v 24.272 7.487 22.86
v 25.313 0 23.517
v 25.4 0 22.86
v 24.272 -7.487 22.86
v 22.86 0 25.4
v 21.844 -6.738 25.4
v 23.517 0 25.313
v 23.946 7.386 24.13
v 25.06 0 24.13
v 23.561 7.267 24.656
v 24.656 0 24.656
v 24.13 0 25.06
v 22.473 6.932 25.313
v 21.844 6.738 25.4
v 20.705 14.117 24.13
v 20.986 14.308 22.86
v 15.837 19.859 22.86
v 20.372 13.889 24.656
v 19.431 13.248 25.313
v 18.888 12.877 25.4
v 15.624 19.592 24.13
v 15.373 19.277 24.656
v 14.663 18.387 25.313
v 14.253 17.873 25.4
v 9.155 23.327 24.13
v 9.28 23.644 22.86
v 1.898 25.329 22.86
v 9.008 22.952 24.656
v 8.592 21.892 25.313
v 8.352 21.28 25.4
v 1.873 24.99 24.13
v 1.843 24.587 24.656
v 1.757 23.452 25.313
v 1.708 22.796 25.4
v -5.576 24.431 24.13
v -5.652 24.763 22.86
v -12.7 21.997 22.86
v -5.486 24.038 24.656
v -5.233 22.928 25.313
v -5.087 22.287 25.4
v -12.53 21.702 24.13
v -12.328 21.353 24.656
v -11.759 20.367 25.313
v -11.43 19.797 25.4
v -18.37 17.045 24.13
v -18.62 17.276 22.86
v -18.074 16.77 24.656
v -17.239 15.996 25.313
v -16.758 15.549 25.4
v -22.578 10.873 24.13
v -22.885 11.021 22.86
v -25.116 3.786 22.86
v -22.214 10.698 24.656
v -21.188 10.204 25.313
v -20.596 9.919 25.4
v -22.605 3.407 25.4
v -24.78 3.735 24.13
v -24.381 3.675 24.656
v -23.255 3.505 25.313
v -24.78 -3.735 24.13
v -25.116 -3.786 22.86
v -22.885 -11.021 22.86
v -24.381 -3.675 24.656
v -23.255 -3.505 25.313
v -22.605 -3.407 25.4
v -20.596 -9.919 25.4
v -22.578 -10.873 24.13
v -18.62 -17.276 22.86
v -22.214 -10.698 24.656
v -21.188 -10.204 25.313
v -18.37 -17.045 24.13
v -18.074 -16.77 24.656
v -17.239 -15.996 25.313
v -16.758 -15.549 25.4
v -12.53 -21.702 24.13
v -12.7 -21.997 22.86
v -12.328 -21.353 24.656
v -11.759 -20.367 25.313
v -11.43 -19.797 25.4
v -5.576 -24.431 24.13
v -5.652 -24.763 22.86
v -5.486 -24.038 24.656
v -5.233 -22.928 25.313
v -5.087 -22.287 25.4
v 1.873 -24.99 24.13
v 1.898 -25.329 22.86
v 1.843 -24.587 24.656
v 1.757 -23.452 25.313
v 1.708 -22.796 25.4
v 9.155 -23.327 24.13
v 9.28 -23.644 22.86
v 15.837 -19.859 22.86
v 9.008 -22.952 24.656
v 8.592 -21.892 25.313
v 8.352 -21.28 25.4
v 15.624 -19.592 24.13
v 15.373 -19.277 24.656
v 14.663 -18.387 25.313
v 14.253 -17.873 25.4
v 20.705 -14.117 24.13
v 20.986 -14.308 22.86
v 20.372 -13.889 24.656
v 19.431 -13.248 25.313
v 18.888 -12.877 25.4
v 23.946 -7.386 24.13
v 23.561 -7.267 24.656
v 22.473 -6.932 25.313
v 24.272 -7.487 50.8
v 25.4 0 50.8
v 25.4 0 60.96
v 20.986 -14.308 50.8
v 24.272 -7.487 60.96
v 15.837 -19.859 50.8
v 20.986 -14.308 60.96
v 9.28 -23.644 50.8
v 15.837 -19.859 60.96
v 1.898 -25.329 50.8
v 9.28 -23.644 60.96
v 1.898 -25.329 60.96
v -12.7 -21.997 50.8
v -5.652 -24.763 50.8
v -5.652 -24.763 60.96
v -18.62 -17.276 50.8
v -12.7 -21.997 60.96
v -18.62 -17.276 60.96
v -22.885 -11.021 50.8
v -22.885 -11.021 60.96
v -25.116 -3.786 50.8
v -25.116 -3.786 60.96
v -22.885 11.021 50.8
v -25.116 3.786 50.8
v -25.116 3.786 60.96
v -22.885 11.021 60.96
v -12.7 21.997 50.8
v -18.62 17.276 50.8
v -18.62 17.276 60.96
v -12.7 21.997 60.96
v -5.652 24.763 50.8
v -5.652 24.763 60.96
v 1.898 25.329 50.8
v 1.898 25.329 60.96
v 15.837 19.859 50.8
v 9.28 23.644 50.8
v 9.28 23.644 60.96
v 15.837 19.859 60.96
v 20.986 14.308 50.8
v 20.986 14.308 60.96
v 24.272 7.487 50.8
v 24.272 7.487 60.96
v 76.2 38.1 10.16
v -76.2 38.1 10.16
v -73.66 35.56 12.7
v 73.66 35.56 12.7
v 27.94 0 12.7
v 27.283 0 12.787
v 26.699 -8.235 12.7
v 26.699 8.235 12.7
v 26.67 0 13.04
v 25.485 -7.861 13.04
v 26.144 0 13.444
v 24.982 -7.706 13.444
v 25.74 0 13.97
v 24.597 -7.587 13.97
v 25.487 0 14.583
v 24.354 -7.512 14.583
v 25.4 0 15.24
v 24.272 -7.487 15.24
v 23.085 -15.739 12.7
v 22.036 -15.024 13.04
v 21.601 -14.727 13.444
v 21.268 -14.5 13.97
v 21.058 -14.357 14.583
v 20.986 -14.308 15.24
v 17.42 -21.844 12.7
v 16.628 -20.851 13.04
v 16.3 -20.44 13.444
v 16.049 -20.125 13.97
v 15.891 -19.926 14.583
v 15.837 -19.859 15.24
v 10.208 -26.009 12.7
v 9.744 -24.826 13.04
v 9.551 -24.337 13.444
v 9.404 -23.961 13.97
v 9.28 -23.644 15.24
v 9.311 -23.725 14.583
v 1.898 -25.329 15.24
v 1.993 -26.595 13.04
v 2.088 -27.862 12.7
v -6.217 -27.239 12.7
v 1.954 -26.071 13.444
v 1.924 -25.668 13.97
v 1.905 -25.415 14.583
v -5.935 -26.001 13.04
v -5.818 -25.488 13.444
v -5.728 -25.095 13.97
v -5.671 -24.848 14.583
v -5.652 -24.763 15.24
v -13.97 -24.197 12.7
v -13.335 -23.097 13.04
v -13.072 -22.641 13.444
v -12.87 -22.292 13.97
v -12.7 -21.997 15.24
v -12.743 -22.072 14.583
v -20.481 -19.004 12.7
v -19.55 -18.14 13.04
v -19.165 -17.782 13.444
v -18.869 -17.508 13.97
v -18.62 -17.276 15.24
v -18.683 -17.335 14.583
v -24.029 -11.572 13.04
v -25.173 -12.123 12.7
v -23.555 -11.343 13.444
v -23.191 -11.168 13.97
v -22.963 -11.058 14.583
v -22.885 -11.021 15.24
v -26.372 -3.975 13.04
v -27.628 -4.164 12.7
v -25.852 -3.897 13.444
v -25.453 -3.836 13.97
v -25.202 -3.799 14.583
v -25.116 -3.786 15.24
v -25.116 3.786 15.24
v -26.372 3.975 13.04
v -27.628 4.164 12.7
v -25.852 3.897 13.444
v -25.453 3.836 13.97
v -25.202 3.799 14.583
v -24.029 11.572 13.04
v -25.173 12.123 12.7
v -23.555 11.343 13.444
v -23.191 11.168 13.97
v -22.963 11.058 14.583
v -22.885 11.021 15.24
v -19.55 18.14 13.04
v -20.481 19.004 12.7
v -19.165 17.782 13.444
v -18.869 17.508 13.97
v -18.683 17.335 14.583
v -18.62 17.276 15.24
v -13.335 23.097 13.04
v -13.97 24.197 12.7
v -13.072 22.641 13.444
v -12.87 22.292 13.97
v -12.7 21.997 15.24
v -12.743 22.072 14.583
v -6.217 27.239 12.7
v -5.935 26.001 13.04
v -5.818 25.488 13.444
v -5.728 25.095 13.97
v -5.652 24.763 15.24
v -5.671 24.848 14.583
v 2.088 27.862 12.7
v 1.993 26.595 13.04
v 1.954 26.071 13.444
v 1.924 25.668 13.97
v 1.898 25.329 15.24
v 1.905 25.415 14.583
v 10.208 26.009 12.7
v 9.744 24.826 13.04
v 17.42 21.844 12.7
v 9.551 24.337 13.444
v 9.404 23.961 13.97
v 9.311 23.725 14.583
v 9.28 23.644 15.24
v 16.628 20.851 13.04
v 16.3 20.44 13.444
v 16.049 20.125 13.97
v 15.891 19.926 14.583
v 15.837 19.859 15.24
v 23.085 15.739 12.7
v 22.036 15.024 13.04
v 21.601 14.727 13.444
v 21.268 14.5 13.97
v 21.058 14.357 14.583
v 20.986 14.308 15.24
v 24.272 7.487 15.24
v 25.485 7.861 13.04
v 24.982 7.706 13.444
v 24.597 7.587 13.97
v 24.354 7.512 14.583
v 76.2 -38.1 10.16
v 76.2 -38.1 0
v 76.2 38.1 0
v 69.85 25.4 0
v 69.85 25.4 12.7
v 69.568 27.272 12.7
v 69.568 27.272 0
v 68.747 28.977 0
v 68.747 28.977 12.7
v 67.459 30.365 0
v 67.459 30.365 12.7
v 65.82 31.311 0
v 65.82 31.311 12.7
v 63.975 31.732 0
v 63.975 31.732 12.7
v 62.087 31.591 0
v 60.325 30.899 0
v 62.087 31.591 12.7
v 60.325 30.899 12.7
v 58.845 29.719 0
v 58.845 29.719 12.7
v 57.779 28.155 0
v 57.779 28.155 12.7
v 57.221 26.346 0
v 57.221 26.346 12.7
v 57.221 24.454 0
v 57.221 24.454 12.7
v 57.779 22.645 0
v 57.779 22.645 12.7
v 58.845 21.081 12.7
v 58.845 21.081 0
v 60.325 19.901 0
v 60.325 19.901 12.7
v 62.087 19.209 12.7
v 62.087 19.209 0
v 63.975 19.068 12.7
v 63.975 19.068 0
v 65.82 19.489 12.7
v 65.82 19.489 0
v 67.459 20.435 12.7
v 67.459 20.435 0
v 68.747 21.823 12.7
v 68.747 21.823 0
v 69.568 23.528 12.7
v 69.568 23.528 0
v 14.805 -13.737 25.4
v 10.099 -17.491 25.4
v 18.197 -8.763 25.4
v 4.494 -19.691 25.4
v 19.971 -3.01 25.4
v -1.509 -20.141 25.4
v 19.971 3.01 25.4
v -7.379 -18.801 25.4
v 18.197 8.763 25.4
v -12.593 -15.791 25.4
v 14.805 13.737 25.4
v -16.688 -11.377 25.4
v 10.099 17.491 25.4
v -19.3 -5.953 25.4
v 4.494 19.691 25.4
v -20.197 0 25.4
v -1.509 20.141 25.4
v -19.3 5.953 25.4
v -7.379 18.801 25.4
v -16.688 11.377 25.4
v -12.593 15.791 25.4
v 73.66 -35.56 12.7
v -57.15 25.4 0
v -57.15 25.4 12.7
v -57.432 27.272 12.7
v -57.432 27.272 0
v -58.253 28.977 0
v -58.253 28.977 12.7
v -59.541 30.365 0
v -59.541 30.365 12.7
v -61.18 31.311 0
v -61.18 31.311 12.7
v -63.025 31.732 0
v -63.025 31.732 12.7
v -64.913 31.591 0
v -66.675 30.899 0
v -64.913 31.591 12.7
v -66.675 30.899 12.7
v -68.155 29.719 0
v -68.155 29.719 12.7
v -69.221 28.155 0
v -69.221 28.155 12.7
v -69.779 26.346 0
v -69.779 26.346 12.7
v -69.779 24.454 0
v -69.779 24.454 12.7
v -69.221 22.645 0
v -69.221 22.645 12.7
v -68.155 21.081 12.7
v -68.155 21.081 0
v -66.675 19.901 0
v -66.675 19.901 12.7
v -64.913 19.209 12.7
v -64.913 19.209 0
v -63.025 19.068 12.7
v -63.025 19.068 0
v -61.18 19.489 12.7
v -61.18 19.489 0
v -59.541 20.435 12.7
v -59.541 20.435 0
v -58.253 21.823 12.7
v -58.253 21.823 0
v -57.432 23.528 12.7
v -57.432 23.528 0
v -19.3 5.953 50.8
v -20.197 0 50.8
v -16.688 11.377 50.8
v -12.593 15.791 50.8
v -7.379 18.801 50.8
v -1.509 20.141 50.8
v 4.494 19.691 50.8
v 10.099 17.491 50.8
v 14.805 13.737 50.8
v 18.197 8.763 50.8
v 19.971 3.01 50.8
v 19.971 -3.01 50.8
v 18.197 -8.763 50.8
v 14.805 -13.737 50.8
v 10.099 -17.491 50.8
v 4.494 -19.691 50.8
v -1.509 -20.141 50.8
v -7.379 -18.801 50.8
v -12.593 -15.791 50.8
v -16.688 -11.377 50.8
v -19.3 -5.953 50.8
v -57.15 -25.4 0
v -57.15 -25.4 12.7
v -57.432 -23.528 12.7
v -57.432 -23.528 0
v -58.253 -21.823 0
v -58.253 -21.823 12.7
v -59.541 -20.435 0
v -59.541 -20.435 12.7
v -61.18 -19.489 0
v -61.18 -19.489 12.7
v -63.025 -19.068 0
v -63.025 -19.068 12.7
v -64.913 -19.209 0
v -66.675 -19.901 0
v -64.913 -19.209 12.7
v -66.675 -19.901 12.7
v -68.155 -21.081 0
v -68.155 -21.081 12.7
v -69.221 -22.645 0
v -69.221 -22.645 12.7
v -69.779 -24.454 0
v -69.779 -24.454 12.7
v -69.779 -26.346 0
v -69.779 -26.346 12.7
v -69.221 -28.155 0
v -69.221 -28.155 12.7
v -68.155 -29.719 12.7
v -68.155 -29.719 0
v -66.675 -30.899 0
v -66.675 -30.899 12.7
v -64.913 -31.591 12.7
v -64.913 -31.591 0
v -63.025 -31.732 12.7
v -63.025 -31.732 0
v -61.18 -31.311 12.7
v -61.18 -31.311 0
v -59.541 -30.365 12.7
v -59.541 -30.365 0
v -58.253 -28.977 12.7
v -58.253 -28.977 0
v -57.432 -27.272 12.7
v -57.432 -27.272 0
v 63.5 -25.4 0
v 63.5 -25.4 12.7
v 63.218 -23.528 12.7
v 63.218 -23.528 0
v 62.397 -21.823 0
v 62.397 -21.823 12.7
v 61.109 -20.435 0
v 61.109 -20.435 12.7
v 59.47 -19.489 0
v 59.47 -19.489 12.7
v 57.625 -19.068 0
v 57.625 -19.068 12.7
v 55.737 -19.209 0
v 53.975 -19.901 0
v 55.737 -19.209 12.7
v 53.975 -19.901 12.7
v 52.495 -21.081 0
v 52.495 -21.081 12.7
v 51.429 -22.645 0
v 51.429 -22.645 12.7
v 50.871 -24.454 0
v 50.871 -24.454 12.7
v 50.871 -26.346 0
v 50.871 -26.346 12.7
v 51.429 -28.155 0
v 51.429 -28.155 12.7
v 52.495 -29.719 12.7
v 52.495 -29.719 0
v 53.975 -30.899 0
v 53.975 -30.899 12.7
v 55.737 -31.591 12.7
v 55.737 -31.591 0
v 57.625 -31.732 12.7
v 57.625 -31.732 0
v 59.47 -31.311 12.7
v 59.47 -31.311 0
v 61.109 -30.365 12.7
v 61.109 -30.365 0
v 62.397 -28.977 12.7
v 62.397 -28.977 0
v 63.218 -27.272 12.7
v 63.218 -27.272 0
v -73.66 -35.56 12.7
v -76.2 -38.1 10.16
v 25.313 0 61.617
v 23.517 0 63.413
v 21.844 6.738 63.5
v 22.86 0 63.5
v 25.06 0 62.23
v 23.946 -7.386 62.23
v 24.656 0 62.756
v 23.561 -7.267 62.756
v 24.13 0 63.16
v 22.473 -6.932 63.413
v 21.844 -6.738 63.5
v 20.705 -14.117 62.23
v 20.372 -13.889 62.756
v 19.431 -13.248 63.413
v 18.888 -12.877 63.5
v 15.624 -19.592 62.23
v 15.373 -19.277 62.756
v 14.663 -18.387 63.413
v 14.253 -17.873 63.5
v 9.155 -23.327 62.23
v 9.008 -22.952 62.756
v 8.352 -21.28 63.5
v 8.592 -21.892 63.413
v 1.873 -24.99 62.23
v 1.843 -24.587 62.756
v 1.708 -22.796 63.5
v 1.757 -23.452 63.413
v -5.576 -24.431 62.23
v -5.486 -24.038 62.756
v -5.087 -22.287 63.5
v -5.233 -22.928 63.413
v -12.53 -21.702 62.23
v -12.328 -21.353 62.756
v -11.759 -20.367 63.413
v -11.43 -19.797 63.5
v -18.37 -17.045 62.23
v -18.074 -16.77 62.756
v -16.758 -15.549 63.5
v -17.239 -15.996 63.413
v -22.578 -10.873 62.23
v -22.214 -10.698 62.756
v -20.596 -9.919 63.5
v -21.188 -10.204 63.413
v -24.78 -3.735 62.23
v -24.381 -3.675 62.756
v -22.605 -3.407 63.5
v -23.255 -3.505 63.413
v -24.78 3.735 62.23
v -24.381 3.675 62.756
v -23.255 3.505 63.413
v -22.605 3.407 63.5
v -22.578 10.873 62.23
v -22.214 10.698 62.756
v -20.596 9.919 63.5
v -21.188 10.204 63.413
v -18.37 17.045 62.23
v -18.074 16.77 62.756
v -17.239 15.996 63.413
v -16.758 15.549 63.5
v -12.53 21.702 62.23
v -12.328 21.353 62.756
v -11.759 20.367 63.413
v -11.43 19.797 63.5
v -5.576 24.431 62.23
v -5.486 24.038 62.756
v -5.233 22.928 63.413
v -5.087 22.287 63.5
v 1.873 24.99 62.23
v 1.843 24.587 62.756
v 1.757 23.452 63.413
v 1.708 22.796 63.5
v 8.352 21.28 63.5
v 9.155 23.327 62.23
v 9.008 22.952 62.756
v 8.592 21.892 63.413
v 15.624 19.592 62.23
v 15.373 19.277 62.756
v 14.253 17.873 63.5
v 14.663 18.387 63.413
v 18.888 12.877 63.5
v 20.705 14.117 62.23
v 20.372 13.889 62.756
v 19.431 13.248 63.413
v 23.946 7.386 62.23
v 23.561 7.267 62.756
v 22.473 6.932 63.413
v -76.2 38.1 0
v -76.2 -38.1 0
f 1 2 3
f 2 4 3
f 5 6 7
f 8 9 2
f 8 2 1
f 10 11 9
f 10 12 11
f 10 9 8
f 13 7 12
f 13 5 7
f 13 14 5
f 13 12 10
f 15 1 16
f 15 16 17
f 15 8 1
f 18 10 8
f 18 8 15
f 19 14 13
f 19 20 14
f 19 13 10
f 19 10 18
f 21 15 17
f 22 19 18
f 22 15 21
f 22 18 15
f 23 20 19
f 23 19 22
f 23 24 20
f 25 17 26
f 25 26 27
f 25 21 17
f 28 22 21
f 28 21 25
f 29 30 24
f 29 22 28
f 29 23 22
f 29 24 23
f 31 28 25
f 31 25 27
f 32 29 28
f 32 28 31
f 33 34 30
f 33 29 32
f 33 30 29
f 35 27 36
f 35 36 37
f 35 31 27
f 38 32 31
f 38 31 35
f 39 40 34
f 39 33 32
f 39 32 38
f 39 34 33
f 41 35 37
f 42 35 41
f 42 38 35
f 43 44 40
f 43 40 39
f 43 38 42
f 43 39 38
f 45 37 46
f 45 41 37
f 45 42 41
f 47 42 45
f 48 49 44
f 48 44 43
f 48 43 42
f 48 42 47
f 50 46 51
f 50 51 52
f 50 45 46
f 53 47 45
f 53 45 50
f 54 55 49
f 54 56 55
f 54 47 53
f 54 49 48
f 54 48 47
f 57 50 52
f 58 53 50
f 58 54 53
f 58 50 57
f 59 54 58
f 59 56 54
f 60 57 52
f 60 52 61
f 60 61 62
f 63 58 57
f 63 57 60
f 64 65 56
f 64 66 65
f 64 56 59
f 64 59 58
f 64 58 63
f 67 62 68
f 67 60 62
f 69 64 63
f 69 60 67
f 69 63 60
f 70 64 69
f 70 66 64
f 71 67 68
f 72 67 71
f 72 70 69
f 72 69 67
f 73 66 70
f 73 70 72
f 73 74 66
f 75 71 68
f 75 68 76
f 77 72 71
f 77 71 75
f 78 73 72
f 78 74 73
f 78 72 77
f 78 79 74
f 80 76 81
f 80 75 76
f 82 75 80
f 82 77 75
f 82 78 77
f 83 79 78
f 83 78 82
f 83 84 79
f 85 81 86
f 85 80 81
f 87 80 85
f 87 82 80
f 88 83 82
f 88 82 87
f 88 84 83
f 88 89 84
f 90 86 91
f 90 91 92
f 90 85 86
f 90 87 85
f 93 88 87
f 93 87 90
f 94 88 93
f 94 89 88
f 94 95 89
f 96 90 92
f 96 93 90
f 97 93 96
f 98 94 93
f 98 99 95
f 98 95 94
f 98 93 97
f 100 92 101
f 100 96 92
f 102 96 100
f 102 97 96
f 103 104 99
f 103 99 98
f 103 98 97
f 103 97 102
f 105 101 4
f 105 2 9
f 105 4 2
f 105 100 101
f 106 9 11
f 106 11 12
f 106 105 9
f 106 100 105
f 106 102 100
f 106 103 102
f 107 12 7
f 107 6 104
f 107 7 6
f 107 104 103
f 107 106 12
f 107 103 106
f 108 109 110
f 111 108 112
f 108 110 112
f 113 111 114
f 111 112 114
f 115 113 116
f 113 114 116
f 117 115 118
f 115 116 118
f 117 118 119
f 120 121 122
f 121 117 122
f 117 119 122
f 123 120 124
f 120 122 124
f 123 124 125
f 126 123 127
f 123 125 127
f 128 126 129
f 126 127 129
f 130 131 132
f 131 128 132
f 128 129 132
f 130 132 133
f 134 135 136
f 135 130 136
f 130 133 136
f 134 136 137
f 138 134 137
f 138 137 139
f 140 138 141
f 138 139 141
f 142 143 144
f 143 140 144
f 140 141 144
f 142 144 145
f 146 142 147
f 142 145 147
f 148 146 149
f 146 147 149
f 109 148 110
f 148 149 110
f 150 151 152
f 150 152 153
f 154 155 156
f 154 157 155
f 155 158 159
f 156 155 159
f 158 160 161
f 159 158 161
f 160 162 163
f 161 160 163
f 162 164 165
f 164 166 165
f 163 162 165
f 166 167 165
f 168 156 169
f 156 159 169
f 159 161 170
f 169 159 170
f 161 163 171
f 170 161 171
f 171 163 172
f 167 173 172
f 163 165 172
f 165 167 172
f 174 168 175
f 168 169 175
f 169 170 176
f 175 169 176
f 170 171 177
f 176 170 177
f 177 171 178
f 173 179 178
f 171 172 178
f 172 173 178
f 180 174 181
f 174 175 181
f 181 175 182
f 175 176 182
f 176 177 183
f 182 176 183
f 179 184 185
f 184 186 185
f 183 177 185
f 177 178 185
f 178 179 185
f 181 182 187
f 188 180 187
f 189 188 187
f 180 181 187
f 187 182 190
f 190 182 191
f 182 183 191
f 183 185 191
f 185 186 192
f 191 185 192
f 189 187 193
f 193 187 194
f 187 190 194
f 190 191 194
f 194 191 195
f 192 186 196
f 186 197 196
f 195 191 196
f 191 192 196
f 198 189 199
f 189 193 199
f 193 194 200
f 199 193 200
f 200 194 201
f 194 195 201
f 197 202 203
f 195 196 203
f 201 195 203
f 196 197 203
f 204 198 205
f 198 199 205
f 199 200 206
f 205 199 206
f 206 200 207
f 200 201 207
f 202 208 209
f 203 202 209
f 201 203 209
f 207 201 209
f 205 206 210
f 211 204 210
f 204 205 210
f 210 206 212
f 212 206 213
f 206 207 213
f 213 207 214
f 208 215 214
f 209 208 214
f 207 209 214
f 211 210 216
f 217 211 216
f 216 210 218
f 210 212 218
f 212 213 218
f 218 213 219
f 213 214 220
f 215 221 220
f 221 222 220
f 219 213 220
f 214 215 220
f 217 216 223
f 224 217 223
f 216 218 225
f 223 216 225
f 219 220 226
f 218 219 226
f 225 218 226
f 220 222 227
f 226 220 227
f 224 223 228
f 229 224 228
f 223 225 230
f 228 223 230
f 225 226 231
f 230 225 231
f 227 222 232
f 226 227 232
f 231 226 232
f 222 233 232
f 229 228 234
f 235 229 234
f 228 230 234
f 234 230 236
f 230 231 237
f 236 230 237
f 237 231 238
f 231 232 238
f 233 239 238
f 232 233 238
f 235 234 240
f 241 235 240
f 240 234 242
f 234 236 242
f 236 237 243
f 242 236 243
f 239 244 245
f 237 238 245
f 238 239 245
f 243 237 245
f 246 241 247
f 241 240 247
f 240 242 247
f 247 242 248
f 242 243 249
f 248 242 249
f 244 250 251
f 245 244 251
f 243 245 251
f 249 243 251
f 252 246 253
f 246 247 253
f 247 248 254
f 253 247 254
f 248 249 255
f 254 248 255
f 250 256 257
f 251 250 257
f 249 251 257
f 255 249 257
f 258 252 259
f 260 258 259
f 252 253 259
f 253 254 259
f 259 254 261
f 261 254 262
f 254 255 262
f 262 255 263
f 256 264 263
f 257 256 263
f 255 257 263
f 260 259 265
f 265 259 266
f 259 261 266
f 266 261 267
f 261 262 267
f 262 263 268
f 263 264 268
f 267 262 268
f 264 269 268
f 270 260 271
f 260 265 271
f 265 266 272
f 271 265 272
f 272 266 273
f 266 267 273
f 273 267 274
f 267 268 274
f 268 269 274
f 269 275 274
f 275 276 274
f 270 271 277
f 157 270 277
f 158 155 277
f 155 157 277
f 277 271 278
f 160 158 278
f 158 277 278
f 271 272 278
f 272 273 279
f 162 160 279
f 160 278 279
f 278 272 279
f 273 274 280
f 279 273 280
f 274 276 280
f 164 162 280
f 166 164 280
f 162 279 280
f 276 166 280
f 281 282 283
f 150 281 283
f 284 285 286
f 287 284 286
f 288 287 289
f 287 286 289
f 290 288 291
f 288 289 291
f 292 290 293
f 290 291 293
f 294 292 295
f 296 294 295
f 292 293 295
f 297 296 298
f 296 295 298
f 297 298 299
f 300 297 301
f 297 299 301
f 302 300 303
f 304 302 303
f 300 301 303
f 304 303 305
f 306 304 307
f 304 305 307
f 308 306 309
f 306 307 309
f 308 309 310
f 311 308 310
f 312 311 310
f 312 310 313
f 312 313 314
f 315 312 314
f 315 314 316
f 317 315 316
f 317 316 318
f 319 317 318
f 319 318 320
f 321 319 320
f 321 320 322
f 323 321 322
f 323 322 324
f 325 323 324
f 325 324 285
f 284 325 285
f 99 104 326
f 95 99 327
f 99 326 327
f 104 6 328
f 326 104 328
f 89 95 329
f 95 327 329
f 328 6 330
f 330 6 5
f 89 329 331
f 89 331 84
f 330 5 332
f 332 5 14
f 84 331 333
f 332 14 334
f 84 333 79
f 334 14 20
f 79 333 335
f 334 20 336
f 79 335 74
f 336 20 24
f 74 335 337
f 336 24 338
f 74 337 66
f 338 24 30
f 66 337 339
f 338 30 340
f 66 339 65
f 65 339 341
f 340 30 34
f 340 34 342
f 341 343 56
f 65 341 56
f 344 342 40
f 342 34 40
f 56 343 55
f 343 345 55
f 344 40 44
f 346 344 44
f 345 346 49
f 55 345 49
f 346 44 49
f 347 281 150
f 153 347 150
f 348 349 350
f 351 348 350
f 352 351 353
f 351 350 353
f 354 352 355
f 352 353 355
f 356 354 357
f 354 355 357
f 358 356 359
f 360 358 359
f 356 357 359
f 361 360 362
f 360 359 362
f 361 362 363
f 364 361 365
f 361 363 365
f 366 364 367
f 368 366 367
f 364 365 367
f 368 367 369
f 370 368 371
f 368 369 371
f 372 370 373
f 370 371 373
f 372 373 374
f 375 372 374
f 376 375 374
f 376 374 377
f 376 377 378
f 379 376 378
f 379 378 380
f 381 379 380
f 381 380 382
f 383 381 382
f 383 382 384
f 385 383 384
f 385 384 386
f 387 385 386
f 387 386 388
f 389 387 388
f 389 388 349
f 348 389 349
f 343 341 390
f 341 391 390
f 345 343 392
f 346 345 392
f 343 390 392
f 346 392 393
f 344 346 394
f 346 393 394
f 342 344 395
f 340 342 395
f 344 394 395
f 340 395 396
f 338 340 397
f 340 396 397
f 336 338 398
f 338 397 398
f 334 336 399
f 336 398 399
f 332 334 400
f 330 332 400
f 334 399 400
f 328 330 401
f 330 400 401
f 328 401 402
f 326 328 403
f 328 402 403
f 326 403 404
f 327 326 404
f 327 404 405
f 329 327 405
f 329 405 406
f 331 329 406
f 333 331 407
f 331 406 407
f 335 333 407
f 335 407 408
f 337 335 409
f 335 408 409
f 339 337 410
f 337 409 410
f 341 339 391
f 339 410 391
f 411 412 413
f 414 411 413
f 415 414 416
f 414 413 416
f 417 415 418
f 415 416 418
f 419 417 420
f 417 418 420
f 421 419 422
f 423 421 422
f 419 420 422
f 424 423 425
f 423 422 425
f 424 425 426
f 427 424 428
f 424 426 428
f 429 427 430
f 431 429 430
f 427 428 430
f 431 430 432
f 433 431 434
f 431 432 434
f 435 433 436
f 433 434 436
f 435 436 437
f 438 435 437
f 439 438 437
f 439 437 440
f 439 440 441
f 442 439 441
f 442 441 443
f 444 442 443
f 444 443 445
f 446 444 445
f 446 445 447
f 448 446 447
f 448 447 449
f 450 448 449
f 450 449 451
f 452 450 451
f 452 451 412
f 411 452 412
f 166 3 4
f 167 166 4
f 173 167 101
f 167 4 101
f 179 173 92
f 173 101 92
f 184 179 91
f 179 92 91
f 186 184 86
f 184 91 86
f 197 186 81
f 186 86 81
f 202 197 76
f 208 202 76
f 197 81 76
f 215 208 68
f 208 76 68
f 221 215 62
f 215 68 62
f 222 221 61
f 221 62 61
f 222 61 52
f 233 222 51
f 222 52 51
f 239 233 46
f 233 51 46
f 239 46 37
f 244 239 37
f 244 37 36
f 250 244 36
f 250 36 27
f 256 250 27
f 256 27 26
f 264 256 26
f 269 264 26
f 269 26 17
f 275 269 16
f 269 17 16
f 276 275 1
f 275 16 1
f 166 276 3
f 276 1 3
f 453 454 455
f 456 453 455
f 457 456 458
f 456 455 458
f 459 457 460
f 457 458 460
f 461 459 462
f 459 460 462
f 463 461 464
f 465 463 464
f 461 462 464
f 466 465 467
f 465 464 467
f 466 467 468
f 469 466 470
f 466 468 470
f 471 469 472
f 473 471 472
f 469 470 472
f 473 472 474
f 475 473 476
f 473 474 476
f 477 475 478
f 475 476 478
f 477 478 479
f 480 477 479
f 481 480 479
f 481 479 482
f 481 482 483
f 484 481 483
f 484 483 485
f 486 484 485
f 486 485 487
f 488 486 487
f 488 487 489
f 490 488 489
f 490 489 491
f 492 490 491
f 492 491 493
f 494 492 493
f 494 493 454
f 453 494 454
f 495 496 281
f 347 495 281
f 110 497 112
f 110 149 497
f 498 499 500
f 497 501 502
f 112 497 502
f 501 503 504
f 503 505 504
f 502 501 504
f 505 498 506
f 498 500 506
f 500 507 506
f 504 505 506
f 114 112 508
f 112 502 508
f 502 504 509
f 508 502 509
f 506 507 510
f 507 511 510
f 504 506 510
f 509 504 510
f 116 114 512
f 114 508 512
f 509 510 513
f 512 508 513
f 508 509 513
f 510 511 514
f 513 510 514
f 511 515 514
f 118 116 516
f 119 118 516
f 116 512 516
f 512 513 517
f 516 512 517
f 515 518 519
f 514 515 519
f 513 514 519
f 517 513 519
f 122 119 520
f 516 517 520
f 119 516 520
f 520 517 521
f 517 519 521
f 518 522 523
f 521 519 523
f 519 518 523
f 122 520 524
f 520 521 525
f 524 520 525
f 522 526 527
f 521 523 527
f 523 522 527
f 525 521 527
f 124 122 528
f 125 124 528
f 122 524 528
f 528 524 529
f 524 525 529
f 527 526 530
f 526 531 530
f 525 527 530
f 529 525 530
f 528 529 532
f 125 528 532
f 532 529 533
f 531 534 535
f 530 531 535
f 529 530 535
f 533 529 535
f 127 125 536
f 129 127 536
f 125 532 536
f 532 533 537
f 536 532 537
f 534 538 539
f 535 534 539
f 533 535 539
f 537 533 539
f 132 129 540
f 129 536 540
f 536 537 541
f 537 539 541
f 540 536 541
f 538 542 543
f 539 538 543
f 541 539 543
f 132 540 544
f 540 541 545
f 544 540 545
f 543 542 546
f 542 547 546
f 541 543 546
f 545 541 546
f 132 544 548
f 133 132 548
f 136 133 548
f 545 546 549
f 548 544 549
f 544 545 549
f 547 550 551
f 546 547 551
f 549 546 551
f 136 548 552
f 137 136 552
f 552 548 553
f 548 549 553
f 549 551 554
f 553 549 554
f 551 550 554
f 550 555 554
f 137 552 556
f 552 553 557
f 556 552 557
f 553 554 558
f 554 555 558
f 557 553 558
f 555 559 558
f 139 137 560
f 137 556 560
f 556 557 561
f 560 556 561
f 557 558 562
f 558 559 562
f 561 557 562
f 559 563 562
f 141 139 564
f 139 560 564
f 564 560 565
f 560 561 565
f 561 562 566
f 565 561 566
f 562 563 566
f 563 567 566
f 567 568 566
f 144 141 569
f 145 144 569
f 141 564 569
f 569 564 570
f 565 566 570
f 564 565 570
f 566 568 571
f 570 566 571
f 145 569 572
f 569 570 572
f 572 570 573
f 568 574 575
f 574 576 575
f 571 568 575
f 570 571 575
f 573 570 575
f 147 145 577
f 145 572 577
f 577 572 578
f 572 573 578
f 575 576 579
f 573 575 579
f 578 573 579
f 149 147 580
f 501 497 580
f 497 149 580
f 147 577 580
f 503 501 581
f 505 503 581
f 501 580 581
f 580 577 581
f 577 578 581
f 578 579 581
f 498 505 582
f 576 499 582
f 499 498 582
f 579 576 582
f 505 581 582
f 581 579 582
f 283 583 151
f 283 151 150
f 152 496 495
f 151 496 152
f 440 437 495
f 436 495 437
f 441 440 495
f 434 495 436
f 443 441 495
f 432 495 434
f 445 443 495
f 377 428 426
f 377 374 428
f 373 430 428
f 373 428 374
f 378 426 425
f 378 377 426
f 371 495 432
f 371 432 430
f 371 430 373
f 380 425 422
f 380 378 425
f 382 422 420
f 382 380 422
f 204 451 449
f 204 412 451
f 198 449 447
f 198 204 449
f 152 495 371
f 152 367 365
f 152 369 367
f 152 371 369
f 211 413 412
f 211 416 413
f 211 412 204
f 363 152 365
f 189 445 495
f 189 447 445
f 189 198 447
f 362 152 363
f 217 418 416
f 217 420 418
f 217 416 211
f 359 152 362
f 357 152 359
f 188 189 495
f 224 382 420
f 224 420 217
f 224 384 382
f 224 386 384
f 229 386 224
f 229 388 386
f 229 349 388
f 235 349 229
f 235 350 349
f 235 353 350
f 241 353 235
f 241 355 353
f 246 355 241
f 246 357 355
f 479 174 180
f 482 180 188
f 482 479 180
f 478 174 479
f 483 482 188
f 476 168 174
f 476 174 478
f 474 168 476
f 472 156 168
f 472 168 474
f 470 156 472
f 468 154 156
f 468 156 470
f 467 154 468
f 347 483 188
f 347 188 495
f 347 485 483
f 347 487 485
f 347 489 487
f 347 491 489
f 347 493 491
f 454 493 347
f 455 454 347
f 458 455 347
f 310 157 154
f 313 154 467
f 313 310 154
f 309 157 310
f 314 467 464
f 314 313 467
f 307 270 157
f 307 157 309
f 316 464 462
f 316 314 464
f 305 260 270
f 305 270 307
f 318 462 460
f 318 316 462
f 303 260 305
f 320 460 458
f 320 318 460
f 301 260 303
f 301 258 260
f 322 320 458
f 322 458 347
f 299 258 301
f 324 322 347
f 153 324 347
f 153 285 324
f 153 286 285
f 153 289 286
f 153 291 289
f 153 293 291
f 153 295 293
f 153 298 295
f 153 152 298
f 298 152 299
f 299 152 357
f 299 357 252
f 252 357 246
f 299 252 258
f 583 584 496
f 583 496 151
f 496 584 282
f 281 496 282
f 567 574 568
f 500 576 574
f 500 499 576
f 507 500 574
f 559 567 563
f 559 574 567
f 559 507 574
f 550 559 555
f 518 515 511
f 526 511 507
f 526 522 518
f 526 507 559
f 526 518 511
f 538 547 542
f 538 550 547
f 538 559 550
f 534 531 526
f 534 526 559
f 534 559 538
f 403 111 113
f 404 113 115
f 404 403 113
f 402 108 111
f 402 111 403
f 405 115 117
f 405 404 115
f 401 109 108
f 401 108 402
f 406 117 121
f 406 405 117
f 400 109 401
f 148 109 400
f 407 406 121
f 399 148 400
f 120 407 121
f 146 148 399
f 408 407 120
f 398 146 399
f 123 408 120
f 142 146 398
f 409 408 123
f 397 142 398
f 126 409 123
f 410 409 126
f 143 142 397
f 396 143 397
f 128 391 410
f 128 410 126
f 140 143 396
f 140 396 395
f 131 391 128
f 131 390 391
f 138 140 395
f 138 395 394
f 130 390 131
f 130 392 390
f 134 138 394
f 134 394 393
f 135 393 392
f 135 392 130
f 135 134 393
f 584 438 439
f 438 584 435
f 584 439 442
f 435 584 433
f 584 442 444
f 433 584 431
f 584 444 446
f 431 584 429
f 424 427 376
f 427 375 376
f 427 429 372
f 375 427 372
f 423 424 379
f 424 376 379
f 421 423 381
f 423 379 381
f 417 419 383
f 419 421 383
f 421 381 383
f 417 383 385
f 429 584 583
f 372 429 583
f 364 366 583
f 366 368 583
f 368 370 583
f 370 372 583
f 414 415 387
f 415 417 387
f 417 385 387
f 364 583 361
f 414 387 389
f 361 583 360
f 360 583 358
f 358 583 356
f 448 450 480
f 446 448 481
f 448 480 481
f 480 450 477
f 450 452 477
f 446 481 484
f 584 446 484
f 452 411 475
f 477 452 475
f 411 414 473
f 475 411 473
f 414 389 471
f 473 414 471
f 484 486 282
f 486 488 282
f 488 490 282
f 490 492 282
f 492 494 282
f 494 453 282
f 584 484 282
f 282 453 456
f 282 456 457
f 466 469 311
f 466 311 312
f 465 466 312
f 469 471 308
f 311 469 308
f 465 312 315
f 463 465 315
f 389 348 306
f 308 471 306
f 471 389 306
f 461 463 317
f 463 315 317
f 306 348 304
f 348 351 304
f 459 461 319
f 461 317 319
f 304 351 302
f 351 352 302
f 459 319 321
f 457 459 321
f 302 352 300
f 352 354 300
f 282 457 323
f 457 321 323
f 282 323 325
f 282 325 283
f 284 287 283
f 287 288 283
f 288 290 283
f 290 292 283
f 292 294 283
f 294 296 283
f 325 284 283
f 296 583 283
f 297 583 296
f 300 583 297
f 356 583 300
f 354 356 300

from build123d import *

# Parameters (mm, degrees)
F0_W     = 152.4
F0_H     = 76.2
F1_DEPTH = 12.7
F2_R     = 6.35
F3_DEPTH = 12.701
F4_DEPTH = 12.701
F5_DEPTH = 12.701
F6_DEPTH = 12.701
F7_W     = 25.4
F7_H     = 50.8
F9_W     = 10.16
F9_H     = 25.4
F11_R    = 2.54
F12_SIZE = 2.54


with BuildPart() as f1:
    # F0 (on Top) → F1 (new body)
    with BuildSketch(Plane.XY):
        Rectangle(F0_W, F0_H)
    extrude(amount=F1_DEPTH)

    # F2 (on face) → F3 (cut, through all)
    with BuildSketch(Plane.XY.offset(12.7)):
        with Locations((57.15, -25.4)):
            Circle(F2_R)
    extrude(amount=-F3_DEPTH, mode=Mode.SUBTRACT)

    # F2 (on face) → F4 (cut, through all)
    with BuildSketch(Plane.XY.offset(12.7)):
        with Locations((63.5, 25.4)):
            Circle(F2_R)
    extrude(amount=-F4_DEPTH, mode=Mode.SUBTRACT)

    # F2 (on face) → F5 (cut, through all)
    with BuildSketch(Plane.XY.offset(12.7)):
        with Locations((-63.5, -25.4)):
            Circle(F2_R)
    extrude(amount=-F5_DEPTH, mode=Mode.SUBTRACT)

    # F2 (on face) → F6 (cut, through all)
    with BuildSketch(Plane.XY.offset(12.7)):
        with Locations((-63.5, 25.4)):
            Circle(F2_R)
    extrude(amount=-F6_DEPTH, mode=Mode.SUBTRACT)

    # F7 (on Front) → F8 (revolve)
    with BuildSketch(Plane.XZ):
        with Locations((12.7, 38.1)):
            Rectangle(F7_W, F7_H)
    revolve(axis=Axis((0, 0, 38.1), (0, 0, -1)))

    # F9 (on Front) → F10 (revolve, cut)
    with BuildSketch(Plane.XZ):
        with Locations((-25.2770464867, 38.1)):
            Rectangle(F9_W, F9_H)
    revolve(axis=Axis((0, 0, 38.1), (0, 0, -1)), mode=Mode.SUBTRACT)

    # F11
    f11_edges = [f1.edges().sort_by_distance(p)[0] for p in [
        (-25.4, 0, 12.7),
        (-25.4, 0, 25.4),
        (-25.4, 0, 63.5),
    ]]
    fillet(f11_edges, radius=F11_R)

    # F12
    f12_edges = [f1.edges().sort_by_distance(p)[0] for p in [
        (0, -38.1, 12.7),
        (-76.2, 0, 12.7),
        (0, 38.1, 12.7),
        (76.2, 0, 12.7),
    ]]
    chamfer(f12_edges, length=F12_SIZE)


solid = f1.part
